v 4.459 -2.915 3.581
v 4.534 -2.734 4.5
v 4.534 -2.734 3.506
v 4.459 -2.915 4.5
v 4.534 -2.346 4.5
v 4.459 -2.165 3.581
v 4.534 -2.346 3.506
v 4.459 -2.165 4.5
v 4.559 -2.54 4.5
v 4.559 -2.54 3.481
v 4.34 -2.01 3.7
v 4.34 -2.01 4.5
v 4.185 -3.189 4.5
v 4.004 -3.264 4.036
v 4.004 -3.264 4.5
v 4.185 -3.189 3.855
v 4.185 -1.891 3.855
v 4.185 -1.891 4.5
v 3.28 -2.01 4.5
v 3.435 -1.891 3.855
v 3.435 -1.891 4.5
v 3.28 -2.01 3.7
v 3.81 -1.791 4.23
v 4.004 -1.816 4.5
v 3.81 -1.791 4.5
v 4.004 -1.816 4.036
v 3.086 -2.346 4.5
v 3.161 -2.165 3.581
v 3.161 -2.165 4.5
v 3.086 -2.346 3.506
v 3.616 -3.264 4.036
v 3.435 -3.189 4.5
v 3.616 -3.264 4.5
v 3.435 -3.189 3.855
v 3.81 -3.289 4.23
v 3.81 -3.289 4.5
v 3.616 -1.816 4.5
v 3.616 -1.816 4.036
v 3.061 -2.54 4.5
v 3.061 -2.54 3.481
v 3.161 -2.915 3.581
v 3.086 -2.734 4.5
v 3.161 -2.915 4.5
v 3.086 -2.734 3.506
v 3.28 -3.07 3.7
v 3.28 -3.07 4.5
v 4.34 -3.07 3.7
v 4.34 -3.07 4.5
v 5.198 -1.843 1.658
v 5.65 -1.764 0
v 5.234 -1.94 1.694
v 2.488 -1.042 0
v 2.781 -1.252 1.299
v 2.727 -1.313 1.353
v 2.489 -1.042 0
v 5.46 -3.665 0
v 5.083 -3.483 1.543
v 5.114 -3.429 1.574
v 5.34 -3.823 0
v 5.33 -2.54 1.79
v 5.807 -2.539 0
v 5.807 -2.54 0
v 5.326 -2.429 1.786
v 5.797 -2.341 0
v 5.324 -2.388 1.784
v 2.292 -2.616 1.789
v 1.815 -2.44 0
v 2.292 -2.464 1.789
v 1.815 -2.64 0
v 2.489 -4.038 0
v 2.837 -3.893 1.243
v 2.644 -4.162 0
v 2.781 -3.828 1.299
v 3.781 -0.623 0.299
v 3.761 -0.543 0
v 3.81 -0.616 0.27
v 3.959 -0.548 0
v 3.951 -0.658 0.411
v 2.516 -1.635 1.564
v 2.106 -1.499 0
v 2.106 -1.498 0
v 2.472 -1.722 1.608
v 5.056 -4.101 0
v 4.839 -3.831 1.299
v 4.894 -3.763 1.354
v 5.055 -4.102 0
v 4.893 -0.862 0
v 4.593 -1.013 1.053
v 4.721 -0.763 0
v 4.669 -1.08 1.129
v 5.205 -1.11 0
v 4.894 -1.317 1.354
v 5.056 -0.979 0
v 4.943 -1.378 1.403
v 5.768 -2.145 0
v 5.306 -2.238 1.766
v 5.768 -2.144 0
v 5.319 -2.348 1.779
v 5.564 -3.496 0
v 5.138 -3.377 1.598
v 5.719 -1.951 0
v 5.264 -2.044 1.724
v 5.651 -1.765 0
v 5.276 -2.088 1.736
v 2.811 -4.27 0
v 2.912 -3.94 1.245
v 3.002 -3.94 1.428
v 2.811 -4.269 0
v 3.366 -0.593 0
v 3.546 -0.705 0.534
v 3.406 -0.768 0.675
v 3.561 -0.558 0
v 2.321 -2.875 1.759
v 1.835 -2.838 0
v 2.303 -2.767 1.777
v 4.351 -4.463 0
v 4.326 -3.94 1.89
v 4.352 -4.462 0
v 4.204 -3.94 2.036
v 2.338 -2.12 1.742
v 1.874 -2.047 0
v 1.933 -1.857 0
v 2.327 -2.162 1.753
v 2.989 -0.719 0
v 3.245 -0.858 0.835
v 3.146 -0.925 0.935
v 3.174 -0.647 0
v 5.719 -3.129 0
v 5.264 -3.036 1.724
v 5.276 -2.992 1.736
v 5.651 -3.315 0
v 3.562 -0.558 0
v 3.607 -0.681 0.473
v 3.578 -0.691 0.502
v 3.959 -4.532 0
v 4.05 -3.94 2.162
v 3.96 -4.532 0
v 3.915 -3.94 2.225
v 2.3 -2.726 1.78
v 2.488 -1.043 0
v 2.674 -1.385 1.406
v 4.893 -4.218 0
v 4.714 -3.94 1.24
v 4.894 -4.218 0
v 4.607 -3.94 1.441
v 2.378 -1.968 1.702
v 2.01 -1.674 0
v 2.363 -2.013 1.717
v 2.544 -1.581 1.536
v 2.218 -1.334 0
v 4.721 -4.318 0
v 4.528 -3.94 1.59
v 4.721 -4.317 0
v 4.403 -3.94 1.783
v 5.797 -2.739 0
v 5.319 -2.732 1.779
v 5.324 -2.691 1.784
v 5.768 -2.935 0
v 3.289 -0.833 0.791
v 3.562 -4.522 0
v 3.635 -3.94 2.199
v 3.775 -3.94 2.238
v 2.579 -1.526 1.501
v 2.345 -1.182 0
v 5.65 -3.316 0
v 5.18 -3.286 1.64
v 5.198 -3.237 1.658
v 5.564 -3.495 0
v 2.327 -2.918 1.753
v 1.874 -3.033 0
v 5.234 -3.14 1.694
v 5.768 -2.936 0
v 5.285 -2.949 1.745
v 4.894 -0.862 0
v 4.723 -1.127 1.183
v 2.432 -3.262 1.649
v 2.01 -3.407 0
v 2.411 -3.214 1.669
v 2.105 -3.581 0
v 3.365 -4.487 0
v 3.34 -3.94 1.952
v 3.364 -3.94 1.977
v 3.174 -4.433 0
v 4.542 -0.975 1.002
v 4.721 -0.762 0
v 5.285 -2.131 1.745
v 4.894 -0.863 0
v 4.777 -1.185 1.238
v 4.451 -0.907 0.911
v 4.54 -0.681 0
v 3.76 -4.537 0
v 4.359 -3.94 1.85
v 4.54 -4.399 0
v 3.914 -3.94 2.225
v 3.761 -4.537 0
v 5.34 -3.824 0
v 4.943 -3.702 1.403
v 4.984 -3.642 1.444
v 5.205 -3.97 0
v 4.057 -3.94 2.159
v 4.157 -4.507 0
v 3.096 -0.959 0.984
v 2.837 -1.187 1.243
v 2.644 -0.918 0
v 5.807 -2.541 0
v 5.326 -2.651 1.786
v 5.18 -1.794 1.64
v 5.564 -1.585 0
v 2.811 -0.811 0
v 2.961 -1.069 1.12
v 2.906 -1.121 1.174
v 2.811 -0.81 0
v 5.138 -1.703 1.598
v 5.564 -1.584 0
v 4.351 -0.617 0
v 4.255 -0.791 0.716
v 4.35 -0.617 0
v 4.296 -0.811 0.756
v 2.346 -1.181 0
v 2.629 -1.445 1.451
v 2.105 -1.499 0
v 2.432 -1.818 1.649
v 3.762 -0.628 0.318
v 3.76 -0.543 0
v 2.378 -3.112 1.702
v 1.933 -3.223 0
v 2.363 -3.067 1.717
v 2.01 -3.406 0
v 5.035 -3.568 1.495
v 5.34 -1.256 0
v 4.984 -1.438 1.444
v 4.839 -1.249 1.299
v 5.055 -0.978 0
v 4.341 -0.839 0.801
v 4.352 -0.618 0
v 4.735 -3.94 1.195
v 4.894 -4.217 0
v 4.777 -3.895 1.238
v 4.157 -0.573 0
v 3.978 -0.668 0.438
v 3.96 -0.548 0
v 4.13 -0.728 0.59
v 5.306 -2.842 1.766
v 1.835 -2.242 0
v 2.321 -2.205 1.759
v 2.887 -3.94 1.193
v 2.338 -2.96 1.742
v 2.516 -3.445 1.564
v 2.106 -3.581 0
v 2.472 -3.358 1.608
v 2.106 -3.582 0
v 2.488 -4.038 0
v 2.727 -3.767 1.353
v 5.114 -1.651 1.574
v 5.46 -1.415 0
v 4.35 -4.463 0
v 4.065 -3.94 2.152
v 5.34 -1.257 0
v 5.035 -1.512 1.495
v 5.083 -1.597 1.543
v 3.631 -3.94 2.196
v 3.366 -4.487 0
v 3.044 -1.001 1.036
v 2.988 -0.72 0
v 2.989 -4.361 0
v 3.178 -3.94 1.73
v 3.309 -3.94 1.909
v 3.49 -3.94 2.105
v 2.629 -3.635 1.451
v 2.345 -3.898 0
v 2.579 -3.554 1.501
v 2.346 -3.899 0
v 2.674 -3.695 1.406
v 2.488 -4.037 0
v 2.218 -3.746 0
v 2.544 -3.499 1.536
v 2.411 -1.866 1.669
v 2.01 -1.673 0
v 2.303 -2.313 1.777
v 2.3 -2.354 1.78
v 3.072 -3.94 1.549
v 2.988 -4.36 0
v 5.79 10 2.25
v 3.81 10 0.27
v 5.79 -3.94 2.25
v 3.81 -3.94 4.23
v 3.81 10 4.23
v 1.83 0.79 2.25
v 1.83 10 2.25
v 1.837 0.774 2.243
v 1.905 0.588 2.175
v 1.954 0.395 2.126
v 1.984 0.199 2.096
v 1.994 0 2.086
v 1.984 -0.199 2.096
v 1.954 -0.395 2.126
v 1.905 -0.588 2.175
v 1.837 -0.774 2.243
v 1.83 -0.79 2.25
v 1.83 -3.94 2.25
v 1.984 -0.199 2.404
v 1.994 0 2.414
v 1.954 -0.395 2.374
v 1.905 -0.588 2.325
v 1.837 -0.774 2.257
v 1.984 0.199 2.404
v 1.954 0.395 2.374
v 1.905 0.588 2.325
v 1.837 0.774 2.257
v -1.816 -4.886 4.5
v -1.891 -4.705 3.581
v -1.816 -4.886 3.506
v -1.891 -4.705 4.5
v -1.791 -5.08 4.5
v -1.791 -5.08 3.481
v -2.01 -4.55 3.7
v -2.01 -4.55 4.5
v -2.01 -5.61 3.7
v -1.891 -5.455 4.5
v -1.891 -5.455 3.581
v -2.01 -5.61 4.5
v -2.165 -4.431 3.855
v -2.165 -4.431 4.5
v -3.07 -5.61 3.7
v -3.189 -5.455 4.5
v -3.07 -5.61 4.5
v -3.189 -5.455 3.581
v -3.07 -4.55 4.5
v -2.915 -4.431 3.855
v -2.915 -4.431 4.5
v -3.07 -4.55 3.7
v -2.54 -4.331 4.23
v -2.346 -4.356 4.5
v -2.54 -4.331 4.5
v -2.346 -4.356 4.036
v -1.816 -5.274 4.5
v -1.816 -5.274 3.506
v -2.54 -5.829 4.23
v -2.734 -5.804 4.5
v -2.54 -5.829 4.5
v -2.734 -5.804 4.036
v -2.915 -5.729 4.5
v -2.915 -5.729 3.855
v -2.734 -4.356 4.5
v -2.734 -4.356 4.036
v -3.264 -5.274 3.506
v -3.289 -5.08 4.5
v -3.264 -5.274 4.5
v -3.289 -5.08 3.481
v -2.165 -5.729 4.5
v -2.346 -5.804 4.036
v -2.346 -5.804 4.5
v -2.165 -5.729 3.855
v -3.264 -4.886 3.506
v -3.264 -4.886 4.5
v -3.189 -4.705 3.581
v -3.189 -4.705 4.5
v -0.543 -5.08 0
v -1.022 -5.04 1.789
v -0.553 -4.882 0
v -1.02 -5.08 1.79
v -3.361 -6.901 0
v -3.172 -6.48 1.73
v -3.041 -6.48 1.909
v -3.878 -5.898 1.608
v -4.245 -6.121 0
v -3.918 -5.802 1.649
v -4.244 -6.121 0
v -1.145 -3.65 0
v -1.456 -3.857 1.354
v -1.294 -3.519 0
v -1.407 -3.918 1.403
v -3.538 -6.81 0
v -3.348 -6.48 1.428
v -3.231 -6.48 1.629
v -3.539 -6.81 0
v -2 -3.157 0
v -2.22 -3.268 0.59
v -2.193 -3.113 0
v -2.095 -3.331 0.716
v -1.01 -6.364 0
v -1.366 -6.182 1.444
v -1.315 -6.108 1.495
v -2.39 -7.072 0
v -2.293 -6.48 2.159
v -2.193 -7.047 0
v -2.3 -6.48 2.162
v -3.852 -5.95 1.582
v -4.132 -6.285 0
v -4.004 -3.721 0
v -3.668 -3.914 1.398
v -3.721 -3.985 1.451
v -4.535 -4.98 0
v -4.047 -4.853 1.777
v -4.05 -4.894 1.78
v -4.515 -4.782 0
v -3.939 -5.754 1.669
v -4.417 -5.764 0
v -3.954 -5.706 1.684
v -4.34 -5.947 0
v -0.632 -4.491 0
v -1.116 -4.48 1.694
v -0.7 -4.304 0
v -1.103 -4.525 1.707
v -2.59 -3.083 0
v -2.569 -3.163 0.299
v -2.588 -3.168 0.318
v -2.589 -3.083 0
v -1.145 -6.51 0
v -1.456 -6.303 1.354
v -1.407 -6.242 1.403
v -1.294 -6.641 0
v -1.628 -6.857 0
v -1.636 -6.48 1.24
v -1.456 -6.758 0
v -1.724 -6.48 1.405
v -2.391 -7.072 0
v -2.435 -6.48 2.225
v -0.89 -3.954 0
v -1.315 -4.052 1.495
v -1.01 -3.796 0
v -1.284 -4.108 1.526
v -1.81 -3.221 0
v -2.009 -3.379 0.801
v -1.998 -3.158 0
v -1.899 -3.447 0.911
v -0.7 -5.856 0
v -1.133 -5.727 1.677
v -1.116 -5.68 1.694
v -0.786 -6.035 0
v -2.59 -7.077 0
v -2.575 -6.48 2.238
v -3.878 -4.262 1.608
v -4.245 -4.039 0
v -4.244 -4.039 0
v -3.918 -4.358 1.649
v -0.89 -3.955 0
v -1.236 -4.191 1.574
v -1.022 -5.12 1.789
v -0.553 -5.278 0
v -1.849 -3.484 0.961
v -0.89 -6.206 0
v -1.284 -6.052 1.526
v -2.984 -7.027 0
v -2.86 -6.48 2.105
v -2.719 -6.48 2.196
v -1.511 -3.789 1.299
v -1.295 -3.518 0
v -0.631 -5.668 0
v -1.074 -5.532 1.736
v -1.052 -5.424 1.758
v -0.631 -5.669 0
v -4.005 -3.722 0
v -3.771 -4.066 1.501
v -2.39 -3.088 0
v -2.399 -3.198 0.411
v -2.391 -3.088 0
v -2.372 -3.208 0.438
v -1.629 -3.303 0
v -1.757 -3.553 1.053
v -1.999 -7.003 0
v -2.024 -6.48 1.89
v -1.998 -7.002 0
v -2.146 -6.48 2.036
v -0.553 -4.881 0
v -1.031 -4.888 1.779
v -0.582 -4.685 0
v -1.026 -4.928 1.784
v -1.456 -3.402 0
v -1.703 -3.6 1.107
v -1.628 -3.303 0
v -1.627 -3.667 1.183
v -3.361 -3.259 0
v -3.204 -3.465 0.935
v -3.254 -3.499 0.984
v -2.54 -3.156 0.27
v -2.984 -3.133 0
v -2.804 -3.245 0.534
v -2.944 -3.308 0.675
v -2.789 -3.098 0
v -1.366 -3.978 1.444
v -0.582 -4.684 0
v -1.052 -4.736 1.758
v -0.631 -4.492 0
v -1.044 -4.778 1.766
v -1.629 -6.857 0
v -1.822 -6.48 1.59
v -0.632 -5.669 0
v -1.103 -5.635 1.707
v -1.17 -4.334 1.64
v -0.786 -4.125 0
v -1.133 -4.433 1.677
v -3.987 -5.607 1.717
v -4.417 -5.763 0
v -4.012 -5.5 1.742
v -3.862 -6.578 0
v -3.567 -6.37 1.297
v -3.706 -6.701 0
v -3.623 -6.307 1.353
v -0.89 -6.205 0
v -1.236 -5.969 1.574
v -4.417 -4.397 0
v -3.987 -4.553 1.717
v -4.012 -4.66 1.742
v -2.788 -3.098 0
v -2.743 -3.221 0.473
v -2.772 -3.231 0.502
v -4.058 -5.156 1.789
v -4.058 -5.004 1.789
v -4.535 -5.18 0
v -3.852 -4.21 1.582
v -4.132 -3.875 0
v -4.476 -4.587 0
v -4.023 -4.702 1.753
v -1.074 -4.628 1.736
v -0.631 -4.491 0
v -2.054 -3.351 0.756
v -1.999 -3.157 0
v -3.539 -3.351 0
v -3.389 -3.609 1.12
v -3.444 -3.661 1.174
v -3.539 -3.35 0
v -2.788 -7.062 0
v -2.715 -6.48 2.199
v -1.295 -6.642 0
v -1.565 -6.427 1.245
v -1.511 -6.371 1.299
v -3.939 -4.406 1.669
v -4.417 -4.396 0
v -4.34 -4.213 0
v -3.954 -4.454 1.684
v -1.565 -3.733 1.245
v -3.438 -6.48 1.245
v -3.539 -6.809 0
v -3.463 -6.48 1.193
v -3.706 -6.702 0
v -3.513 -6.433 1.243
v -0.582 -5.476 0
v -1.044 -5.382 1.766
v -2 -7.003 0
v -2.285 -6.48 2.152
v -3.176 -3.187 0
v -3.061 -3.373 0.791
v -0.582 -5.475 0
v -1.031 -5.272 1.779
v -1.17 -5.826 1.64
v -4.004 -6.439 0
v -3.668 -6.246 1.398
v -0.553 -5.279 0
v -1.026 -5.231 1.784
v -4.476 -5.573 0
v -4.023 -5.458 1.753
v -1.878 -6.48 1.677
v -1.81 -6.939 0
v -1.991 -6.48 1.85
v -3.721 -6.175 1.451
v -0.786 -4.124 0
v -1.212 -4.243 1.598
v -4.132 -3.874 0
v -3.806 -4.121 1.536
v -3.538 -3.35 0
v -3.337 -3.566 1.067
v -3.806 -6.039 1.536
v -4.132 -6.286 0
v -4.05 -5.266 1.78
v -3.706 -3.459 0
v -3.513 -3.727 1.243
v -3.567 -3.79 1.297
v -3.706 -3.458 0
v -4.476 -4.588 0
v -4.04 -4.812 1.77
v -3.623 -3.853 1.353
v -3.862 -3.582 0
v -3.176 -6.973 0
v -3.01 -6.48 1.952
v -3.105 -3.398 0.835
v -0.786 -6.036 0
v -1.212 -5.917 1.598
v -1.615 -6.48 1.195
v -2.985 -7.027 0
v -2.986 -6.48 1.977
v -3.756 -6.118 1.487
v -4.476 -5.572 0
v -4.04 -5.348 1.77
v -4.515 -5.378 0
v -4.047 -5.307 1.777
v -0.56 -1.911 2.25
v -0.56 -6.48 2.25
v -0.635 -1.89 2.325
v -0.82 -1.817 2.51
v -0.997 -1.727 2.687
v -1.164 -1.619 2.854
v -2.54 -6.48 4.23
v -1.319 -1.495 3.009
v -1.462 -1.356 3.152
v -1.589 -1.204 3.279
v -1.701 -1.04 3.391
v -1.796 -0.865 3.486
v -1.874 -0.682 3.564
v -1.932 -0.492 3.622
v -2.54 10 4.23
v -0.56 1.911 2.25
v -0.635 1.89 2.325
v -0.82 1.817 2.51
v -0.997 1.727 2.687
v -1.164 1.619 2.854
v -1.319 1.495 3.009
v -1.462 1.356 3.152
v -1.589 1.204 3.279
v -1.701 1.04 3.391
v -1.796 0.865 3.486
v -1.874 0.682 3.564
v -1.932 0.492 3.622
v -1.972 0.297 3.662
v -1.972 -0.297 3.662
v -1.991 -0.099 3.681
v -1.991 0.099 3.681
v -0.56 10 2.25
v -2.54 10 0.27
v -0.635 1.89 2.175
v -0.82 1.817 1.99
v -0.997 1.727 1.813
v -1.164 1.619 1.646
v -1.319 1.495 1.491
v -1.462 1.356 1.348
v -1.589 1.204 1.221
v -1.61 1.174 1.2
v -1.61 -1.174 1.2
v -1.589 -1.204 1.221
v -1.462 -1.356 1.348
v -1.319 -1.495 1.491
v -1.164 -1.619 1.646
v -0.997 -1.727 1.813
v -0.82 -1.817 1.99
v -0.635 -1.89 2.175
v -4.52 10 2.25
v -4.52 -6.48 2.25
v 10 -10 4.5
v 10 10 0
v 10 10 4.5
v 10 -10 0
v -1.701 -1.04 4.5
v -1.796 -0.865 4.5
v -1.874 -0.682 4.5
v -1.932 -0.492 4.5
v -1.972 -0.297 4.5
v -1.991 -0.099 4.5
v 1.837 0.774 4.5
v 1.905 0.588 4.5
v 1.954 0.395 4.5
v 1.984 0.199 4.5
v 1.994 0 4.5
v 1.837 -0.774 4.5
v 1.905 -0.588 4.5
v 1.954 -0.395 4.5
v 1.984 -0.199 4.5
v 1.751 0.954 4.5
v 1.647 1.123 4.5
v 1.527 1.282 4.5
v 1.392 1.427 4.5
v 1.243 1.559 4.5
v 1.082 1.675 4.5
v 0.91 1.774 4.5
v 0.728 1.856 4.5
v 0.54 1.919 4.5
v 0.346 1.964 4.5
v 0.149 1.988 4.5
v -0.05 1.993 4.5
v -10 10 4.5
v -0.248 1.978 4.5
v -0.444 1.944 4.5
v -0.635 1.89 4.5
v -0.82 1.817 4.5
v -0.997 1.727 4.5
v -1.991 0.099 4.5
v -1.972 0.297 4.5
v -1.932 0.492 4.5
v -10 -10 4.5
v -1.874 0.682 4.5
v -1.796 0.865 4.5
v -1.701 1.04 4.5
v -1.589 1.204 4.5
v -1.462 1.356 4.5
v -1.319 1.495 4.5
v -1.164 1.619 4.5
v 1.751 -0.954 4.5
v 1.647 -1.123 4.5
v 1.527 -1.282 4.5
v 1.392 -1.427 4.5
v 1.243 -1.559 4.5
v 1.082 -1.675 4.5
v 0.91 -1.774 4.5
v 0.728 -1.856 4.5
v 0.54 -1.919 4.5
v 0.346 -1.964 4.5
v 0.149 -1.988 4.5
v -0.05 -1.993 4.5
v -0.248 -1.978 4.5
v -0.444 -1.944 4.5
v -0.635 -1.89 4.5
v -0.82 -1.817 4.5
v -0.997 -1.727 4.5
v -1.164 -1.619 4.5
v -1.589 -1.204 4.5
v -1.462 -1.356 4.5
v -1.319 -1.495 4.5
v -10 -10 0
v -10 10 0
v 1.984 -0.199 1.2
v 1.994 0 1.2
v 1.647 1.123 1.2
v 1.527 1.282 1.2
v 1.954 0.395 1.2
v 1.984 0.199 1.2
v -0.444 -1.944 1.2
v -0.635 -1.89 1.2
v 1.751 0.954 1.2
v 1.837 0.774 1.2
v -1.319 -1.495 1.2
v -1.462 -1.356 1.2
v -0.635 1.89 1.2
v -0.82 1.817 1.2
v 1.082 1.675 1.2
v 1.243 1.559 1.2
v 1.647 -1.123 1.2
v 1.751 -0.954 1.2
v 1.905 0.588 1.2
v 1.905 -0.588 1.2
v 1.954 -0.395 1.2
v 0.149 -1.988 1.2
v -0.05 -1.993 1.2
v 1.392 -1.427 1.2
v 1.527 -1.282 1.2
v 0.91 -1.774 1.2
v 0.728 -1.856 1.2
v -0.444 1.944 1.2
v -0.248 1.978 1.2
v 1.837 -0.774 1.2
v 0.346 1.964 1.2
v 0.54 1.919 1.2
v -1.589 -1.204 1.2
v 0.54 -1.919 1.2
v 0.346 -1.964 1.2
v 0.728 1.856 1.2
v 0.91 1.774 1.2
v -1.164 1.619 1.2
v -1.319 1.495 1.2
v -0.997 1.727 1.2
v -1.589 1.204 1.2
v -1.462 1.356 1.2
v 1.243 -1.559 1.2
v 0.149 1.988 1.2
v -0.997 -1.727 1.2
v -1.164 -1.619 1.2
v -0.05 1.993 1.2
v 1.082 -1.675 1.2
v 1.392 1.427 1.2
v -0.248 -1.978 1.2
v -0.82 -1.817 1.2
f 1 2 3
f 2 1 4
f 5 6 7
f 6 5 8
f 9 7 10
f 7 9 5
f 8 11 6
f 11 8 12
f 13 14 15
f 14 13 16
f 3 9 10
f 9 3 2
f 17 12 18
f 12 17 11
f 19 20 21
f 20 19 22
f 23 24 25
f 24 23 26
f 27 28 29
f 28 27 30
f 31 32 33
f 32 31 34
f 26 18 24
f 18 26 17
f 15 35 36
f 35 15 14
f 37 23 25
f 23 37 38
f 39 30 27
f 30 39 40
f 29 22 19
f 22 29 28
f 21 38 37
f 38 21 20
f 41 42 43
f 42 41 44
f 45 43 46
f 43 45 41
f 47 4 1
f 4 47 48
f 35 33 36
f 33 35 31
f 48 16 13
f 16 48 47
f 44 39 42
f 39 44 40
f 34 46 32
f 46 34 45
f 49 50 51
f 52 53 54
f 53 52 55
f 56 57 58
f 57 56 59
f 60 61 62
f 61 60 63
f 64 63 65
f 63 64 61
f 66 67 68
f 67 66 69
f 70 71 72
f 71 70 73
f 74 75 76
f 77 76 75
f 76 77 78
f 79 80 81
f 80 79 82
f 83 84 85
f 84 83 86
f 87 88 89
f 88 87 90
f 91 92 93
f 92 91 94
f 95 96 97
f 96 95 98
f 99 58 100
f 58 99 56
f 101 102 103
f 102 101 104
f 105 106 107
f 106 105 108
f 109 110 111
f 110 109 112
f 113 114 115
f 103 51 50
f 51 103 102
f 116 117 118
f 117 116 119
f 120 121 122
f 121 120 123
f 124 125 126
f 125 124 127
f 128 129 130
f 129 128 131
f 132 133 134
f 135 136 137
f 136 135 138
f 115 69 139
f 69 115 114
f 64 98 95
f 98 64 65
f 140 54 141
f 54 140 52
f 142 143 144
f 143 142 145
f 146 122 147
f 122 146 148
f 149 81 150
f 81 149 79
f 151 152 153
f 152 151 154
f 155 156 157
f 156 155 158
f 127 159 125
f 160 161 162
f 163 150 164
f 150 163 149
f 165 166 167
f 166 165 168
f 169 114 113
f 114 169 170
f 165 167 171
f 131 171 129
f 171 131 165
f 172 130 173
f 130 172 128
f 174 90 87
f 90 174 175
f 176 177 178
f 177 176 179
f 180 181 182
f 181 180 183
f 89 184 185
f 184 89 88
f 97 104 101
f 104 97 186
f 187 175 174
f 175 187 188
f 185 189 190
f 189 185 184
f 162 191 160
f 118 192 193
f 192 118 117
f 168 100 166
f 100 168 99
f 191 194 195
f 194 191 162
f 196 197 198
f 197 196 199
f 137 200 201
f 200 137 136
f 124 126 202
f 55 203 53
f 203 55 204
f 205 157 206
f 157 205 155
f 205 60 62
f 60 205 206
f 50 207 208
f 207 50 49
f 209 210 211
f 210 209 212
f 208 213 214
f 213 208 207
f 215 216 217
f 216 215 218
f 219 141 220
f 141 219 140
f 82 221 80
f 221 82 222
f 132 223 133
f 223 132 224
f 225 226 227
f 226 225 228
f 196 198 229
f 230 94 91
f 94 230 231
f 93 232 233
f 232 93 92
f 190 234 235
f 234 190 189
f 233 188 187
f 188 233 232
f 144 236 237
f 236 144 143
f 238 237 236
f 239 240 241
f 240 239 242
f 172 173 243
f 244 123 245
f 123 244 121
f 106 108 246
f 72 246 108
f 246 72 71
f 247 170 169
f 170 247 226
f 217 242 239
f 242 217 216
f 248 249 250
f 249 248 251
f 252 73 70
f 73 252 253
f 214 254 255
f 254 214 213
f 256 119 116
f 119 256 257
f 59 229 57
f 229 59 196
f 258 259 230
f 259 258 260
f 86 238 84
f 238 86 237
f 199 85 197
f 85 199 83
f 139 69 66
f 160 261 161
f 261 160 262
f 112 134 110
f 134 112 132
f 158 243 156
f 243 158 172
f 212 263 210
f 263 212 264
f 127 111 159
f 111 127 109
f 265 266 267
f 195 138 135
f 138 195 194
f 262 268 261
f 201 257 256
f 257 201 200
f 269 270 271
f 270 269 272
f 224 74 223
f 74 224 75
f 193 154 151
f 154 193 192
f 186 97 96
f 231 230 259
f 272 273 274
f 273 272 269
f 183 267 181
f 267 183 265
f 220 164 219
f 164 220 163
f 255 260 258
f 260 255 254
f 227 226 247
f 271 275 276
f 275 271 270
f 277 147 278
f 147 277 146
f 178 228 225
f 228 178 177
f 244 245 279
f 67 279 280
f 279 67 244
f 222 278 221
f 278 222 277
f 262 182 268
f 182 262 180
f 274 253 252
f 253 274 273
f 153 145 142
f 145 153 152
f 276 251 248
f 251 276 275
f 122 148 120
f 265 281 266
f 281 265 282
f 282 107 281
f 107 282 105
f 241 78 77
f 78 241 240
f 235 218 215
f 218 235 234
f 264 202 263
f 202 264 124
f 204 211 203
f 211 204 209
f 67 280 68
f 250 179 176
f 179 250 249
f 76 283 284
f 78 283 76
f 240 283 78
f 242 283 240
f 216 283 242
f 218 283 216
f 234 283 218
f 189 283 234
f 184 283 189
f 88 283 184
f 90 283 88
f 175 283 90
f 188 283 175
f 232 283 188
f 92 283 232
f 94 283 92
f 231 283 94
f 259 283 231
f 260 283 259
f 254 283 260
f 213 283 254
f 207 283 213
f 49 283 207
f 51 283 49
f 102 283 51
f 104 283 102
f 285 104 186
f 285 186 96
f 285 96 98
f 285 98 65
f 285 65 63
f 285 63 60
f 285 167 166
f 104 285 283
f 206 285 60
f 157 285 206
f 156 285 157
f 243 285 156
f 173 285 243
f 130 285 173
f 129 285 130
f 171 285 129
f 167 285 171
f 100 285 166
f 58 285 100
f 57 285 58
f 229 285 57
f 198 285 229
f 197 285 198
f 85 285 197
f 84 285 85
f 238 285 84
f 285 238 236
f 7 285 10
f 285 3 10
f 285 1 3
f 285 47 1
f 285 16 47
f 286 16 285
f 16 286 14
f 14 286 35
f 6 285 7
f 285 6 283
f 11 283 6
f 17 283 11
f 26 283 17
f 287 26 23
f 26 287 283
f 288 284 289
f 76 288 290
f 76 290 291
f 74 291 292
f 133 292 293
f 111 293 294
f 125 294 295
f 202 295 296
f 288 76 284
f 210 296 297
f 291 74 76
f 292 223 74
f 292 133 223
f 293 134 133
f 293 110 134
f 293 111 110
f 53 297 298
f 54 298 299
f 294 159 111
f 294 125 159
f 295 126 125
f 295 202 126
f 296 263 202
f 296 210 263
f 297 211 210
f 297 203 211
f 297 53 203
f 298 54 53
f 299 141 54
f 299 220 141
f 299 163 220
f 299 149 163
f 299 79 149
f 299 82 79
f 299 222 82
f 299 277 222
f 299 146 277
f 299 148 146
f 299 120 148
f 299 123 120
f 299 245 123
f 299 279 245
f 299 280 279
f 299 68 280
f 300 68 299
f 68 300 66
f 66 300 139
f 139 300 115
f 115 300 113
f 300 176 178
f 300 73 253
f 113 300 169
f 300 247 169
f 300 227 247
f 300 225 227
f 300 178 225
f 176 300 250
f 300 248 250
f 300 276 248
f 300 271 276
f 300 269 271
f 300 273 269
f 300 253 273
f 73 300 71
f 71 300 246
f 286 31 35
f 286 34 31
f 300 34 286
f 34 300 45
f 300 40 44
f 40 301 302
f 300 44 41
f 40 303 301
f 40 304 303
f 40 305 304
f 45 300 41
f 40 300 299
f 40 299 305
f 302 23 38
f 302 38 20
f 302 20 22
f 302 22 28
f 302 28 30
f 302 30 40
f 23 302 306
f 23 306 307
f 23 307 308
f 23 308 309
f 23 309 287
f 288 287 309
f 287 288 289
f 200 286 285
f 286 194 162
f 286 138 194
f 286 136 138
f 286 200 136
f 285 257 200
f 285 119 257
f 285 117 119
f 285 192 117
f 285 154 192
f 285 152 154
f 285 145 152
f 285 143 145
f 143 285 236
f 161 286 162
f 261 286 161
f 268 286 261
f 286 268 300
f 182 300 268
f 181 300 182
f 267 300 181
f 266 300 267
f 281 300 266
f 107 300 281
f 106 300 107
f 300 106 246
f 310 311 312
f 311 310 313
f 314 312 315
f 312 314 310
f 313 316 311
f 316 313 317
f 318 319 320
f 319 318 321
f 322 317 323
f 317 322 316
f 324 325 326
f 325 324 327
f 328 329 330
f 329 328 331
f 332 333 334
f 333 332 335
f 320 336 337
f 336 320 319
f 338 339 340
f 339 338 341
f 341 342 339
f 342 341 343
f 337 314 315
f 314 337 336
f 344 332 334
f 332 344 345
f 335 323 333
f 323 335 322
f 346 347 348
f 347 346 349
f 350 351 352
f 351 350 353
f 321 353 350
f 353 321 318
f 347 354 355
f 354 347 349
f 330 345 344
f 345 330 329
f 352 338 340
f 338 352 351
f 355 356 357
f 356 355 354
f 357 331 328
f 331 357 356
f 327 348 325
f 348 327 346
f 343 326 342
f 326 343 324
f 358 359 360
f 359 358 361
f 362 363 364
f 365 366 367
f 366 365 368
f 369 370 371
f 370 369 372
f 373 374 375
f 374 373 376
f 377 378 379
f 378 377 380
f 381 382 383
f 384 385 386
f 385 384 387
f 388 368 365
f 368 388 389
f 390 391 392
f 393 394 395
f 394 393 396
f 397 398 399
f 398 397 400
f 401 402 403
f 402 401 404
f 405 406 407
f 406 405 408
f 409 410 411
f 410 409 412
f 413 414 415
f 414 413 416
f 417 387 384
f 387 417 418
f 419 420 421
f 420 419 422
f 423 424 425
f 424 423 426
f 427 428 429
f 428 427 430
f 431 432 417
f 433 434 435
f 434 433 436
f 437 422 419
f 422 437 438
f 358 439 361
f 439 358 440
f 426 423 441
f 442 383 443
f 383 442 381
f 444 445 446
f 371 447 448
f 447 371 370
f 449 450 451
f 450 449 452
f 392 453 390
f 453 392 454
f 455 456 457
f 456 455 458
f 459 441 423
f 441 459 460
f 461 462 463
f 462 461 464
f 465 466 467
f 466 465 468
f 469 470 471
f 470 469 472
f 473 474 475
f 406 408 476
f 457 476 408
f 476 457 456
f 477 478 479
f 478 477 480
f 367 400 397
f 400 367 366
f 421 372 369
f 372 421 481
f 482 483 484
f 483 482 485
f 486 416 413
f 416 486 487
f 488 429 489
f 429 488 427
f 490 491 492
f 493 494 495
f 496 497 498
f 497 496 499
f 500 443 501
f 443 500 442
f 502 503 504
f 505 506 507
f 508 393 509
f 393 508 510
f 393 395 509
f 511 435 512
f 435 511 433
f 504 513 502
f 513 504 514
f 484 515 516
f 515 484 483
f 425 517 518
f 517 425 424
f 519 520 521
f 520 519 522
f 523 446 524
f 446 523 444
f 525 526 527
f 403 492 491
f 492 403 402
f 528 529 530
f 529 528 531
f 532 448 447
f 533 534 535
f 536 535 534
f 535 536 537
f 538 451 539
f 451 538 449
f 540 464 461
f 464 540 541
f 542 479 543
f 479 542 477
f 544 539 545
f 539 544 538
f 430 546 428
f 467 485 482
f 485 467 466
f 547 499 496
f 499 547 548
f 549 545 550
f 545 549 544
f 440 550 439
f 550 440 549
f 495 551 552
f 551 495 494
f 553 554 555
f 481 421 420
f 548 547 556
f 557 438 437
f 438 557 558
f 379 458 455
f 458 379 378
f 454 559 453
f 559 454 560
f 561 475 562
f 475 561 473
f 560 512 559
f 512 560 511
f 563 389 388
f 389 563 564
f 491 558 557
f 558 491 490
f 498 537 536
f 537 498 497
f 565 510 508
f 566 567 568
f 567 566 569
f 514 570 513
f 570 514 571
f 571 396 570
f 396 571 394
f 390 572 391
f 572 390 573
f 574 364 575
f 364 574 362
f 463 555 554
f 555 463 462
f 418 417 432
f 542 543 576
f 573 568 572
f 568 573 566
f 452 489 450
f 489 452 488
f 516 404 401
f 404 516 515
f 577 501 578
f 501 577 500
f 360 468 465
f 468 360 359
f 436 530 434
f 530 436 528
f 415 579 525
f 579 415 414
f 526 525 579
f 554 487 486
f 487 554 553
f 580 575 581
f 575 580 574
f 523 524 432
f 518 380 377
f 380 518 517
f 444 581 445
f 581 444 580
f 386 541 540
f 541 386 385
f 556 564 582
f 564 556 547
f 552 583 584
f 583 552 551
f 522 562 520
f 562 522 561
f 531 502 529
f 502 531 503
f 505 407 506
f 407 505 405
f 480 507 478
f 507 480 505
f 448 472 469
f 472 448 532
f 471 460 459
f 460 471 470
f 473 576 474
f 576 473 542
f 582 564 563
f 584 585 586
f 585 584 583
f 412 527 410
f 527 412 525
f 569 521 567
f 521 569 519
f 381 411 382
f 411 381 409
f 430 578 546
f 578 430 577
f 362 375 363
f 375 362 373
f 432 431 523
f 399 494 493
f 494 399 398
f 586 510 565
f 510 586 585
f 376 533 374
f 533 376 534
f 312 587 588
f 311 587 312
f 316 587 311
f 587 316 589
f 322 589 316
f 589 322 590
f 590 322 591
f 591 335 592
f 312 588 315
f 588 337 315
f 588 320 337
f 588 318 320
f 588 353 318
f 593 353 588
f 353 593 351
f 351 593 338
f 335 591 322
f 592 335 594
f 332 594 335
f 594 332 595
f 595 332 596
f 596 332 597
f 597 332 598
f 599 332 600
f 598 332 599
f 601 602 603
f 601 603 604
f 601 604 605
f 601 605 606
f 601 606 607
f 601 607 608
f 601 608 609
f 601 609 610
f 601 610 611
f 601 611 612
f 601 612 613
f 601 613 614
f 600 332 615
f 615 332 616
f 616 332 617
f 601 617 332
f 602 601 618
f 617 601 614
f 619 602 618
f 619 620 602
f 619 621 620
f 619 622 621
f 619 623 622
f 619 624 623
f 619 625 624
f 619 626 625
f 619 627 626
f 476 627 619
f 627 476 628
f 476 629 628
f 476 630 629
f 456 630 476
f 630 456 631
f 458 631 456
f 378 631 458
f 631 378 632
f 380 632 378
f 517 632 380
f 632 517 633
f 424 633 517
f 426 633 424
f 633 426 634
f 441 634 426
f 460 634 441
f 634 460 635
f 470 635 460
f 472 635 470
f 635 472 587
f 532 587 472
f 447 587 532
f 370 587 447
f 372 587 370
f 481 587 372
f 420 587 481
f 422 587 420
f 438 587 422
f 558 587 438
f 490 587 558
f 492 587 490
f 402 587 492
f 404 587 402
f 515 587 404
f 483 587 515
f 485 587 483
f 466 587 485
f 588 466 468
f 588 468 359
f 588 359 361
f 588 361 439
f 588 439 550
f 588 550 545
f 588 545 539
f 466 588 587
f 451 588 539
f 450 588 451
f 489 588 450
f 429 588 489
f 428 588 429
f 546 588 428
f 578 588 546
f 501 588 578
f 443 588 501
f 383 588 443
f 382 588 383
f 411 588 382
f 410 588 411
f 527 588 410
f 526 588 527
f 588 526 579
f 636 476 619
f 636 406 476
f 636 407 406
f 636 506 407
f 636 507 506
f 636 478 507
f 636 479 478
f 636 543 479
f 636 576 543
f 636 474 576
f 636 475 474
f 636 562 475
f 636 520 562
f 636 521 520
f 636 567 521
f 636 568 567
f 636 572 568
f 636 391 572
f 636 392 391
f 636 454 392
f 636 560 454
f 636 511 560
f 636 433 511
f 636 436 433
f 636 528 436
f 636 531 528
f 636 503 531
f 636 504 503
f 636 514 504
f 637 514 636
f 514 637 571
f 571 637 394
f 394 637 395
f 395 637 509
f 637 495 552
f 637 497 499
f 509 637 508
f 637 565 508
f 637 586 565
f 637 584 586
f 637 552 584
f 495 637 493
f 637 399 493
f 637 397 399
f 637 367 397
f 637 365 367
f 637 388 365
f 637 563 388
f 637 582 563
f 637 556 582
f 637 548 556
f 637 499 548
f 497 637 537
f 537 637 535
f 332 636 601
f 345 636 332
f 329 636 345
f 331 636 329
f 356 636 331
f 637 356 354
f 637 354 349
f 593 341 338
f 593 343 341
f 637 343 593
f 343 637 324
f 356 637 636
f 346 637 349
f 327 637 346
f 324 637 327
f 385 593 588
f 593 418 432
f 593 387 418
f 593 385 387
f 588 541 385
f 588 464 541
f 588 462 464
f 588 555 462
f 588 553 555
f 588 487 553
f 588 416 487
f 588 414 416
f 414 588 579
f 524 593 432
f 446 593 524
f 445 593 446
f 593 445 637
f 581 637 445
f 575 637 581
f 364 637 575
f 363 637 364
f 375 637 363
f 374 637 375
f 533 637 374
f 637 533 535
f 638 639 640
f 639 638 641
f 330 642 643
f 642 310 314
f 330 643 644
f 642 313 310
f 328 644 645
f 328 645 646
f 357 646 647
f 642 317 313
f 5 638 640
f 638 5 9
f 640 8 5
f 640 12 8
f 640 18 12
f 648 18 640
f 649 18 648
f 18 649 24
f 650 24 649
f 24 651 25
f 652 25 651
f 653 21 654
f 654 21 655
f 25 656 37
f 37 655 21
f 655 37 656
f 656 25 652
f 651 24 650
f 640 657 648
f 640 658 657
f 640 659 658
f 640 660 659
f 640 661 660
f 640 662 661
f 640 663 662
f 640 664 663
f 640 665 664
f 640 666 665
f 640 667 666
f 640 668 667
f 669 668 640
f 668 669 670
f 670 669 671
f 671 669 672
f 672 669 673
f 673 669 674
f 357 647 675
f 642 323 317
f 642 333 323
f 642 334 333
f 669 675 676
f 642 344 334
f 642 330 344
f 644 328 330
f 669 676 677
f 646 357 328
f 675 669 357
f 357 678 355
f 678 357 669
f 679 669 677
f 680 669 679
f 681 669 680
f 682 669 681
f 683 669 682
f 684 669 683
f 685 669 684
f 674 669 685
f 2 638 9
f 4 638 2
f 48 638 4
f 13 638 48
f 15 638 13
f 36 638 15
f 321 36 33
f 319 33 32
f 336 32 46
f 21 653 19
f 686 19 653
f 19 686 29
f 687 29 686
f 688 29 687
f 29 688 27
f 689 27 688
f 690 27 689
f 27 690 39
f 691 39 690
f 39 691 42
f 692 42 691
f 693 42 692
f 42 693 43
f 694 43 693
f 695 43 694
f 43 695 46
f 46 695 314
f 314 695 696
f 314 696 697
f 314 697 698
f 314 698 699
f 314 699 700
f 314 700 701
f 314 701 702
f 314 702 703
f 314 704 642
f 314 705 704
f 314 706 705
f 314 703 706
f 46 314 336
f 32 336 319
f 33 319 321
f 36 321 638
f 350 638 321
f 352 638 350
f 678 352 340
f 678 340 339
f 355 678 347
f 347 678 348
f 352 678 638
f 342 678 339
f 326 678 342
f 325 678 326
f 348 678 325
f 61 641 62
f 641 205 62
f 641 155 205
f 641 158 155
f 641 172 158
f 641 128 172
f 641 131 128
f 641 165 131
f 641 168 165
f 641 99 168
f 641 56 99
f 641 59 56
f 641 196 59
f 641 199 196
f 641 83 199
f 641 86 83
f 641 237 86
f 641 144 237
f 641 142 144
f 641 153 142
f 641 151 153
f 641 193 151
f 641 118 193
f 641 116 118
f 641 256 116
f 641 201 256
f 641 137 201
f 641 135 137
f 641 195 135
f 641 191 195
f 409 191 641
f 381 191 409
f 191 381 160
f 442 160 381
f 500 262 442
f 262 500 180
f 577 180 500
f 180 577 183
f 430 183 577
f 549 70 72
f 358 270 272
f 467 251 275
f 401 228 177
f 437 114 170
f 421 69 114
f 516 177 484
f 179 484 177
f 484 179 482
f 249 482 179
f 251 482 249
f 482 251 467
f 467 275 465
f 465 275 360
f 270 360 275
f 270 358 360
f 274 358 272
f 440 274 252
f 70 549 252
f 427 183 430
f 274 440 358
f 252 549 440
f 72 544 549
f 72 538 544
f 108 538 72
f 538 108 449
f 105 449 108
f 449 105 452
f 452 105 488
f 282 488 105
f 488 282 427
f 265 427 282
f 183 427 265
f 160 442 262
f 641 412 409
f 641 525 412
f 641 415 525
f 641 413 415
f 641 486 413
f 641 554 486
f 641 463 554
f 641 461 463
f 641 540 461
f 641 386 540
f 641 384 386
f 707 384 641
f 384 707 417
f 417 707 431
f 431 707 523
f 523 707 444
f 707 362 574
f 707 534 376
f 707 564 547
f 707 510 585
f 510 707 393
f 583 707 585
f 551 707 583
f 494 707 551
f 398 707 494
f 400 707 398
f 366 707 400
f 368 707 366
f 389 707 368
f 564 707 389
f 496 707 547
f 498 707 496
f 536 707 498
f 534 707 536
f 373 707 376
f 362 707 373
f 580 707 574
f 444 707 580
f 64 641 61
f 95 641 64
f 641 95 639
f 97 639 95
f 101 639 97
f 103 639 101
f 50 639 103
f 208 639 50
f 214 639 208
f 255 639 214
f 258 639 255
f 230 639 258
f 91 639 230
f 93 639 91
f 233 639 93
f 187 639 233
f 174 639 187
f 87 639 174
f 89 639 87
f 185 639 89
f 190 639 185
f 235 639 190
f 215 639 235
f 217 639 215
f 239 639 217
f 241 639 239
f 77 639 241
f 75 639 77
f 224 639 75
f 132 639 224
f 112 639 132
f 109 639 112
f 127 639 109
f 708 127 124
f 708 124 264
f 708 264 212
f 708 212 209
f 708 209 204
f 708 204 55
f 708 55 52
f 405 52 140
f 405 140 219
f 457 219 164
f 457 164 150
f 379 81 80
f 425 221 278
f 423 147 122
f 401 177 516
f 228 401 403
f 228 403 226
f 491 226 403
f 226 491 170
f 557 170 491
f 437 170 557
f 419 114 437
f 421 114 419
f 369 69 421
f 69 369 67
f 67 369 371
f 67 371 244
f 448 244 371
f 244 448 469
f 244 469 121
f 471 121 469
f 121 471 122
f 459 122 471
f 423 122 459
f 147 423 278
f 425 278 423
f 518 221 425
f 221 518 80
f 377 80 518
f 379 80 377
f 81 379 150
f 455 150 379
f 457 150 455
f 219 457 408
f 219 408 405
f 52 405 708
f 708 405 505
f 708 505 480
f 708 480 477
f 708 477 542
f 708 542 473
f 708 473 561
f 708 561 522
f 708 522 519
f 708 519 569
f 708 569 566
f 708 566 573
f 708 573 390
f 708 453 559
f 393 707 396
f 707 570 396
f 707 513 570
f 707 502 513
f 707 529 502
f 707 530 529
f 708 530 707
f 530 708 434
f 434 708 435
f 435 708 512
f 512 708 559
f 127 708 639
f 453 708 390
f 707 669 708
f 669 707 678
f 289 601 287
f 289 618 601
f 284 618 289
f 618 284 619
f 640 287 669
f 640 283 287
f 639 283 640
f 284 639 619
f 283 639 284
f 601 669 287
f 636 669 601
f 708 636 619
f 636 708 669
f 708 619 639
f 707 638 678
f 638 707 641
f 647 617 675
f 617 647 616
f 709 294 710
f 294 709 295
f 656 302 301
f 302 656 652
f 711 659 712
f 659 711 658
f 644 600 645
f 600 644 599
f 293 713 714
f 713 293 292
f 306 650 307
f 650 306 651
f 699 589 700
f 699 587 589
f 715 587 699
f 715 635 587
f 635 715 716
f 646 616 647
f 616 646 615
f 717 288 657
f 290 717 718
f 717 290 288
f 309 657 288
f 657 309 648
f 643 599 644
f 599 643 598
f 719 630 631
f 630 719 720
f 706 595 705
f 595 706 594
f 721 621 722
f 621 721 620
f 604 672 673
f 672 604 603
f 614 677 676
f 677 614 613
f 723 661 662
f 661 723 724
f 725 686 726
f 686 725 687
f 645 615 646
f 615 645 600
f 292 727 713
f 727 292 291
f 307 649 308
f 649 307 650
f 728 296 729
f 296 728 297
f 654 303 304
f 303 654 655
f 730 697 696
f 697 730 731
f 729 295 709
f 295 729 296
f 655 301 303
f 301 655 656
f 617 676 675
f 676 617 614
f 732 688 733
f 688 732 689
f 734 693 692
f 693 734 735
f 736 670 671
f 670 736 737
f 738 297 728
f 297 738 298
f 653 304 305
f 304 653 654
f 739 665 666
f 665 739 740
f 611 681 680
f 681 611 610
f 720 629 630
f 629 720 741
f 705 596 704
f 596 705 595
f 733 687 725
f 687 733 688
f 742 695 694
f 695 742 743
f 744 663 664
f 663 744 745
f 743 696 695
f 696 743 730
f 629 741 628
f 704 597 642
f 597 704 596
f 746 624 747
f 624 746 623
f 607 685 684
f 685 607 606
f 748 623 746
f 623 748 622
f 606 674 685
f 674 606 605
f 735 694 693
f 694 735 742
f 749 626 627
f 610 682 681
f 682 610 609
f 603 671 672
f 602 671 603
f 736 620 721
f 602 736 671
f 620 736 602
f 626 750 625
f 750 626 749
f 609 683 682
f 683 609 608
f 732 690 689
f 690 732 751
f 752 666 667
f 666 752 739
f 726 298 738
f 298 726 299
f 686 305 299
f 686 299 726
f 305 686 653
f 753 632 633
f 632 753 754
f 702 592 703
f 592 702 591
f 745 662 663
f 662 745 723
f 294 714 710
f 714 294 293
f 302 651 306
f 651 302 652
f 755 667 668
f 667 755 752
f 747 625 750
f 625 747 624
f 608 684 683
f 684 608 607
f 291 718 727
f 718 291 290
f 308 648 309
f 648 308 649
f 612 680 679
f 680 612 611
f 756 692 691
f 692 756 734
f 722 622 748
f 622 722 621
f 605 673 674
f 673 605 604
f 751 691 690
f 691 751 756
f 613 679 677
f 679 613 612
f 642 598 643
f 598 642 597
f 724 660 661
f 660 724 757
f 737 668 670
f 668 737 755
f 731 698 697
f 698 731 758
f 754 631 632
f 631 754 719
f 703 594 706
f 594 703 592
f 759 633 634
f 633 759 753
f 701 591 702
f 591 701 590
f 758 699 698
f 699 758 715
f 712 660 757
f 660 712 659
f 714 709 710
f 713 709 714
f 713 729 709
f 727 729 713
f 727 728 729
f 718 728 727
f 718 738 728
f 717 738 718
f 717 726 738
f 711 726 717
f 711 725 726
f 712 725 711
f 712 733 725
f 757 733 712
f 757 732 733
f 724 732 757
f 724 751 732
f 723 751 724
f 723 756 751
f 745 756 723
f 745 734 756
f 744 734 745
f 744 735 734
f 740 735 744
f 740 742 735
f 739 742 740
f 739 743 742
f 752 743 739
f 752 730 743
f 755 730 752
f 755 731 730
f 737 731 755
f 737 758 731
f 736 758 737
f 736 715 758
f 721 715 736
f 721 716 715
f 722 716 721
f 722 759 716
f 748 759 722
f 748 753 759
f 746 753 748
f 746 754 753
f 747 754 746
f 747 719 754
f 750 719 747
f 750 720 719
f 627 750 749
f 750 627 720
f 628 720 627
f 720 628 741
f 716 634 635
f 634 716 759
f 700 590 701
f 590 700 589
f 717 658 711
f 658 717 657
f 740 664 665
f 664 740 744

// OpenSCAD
// MX Series Datasheet: <https://cdn.sparkfun.com/datasheets/Components/Switches/MX%20Series.pdf>

INCHES = 25.4;

pin_length = 3.30;
center_hole_diam = 0.157 * INCHES;
pin_hole_diam = 0.059 * INCHES;
led_hole_diam = 0.039 * INCHES;
pin_plus_pos = [3 * 0.05 * INCHES, -2 * 0.05 * INCHES];
pin_minus_pos = [-2 * 0.05 * INCHES, -4 * 0.05 * INCHES];
led_plus_pos = [1 * 0.05 * INCHES, 4 * 0.05 * INCHES];
led_minus_pos = [-1 * 0.05 * INCHES, 4 * 0.05 * INCHES];

// 

hole_clearance = 0.1;
square_dim = 20;
floor_thickness = 1.2;
square_thickness = pin_length + floor_thickness;
wire_hole_diam = 2.8;
wire_hole_z = square_thickness / 2;
bottom_hole_diam = 4;

EPS = 0.01;
$fa = 1;
$fs = 0.2;

difference() {
    translate([-square_dim/2, -square_dim/2, 0]) cube([square_dim, square_dim, square_thickness]);
    translate([0, 0, floor_thickness]) linear_extrude(height = pin_length + EPS, convexity = 5) {
        circle(d = center_hole_diam);
    };
    for (pin = [pin_plus_pos, pin_minus_pos]) {
        translate([pin[0], pin[1], -EPS]) cylinder(d = pin_hole_diam, h = square_thickness + EPS * 2);
        translate([pin[0], pin[1], -EPS]) cylinder(d1 = bottom_hole_diam, d2 = wire_hole_diam, h = wire_hole_z);

        d = wire_hole_diam;
        translate([pin[0], pin[1] + square_dim / 2 - d / 2, wire_hole_z]) rotate([0, 45, 0]) cube([d, square_dim, d], center = true);
    };
}
